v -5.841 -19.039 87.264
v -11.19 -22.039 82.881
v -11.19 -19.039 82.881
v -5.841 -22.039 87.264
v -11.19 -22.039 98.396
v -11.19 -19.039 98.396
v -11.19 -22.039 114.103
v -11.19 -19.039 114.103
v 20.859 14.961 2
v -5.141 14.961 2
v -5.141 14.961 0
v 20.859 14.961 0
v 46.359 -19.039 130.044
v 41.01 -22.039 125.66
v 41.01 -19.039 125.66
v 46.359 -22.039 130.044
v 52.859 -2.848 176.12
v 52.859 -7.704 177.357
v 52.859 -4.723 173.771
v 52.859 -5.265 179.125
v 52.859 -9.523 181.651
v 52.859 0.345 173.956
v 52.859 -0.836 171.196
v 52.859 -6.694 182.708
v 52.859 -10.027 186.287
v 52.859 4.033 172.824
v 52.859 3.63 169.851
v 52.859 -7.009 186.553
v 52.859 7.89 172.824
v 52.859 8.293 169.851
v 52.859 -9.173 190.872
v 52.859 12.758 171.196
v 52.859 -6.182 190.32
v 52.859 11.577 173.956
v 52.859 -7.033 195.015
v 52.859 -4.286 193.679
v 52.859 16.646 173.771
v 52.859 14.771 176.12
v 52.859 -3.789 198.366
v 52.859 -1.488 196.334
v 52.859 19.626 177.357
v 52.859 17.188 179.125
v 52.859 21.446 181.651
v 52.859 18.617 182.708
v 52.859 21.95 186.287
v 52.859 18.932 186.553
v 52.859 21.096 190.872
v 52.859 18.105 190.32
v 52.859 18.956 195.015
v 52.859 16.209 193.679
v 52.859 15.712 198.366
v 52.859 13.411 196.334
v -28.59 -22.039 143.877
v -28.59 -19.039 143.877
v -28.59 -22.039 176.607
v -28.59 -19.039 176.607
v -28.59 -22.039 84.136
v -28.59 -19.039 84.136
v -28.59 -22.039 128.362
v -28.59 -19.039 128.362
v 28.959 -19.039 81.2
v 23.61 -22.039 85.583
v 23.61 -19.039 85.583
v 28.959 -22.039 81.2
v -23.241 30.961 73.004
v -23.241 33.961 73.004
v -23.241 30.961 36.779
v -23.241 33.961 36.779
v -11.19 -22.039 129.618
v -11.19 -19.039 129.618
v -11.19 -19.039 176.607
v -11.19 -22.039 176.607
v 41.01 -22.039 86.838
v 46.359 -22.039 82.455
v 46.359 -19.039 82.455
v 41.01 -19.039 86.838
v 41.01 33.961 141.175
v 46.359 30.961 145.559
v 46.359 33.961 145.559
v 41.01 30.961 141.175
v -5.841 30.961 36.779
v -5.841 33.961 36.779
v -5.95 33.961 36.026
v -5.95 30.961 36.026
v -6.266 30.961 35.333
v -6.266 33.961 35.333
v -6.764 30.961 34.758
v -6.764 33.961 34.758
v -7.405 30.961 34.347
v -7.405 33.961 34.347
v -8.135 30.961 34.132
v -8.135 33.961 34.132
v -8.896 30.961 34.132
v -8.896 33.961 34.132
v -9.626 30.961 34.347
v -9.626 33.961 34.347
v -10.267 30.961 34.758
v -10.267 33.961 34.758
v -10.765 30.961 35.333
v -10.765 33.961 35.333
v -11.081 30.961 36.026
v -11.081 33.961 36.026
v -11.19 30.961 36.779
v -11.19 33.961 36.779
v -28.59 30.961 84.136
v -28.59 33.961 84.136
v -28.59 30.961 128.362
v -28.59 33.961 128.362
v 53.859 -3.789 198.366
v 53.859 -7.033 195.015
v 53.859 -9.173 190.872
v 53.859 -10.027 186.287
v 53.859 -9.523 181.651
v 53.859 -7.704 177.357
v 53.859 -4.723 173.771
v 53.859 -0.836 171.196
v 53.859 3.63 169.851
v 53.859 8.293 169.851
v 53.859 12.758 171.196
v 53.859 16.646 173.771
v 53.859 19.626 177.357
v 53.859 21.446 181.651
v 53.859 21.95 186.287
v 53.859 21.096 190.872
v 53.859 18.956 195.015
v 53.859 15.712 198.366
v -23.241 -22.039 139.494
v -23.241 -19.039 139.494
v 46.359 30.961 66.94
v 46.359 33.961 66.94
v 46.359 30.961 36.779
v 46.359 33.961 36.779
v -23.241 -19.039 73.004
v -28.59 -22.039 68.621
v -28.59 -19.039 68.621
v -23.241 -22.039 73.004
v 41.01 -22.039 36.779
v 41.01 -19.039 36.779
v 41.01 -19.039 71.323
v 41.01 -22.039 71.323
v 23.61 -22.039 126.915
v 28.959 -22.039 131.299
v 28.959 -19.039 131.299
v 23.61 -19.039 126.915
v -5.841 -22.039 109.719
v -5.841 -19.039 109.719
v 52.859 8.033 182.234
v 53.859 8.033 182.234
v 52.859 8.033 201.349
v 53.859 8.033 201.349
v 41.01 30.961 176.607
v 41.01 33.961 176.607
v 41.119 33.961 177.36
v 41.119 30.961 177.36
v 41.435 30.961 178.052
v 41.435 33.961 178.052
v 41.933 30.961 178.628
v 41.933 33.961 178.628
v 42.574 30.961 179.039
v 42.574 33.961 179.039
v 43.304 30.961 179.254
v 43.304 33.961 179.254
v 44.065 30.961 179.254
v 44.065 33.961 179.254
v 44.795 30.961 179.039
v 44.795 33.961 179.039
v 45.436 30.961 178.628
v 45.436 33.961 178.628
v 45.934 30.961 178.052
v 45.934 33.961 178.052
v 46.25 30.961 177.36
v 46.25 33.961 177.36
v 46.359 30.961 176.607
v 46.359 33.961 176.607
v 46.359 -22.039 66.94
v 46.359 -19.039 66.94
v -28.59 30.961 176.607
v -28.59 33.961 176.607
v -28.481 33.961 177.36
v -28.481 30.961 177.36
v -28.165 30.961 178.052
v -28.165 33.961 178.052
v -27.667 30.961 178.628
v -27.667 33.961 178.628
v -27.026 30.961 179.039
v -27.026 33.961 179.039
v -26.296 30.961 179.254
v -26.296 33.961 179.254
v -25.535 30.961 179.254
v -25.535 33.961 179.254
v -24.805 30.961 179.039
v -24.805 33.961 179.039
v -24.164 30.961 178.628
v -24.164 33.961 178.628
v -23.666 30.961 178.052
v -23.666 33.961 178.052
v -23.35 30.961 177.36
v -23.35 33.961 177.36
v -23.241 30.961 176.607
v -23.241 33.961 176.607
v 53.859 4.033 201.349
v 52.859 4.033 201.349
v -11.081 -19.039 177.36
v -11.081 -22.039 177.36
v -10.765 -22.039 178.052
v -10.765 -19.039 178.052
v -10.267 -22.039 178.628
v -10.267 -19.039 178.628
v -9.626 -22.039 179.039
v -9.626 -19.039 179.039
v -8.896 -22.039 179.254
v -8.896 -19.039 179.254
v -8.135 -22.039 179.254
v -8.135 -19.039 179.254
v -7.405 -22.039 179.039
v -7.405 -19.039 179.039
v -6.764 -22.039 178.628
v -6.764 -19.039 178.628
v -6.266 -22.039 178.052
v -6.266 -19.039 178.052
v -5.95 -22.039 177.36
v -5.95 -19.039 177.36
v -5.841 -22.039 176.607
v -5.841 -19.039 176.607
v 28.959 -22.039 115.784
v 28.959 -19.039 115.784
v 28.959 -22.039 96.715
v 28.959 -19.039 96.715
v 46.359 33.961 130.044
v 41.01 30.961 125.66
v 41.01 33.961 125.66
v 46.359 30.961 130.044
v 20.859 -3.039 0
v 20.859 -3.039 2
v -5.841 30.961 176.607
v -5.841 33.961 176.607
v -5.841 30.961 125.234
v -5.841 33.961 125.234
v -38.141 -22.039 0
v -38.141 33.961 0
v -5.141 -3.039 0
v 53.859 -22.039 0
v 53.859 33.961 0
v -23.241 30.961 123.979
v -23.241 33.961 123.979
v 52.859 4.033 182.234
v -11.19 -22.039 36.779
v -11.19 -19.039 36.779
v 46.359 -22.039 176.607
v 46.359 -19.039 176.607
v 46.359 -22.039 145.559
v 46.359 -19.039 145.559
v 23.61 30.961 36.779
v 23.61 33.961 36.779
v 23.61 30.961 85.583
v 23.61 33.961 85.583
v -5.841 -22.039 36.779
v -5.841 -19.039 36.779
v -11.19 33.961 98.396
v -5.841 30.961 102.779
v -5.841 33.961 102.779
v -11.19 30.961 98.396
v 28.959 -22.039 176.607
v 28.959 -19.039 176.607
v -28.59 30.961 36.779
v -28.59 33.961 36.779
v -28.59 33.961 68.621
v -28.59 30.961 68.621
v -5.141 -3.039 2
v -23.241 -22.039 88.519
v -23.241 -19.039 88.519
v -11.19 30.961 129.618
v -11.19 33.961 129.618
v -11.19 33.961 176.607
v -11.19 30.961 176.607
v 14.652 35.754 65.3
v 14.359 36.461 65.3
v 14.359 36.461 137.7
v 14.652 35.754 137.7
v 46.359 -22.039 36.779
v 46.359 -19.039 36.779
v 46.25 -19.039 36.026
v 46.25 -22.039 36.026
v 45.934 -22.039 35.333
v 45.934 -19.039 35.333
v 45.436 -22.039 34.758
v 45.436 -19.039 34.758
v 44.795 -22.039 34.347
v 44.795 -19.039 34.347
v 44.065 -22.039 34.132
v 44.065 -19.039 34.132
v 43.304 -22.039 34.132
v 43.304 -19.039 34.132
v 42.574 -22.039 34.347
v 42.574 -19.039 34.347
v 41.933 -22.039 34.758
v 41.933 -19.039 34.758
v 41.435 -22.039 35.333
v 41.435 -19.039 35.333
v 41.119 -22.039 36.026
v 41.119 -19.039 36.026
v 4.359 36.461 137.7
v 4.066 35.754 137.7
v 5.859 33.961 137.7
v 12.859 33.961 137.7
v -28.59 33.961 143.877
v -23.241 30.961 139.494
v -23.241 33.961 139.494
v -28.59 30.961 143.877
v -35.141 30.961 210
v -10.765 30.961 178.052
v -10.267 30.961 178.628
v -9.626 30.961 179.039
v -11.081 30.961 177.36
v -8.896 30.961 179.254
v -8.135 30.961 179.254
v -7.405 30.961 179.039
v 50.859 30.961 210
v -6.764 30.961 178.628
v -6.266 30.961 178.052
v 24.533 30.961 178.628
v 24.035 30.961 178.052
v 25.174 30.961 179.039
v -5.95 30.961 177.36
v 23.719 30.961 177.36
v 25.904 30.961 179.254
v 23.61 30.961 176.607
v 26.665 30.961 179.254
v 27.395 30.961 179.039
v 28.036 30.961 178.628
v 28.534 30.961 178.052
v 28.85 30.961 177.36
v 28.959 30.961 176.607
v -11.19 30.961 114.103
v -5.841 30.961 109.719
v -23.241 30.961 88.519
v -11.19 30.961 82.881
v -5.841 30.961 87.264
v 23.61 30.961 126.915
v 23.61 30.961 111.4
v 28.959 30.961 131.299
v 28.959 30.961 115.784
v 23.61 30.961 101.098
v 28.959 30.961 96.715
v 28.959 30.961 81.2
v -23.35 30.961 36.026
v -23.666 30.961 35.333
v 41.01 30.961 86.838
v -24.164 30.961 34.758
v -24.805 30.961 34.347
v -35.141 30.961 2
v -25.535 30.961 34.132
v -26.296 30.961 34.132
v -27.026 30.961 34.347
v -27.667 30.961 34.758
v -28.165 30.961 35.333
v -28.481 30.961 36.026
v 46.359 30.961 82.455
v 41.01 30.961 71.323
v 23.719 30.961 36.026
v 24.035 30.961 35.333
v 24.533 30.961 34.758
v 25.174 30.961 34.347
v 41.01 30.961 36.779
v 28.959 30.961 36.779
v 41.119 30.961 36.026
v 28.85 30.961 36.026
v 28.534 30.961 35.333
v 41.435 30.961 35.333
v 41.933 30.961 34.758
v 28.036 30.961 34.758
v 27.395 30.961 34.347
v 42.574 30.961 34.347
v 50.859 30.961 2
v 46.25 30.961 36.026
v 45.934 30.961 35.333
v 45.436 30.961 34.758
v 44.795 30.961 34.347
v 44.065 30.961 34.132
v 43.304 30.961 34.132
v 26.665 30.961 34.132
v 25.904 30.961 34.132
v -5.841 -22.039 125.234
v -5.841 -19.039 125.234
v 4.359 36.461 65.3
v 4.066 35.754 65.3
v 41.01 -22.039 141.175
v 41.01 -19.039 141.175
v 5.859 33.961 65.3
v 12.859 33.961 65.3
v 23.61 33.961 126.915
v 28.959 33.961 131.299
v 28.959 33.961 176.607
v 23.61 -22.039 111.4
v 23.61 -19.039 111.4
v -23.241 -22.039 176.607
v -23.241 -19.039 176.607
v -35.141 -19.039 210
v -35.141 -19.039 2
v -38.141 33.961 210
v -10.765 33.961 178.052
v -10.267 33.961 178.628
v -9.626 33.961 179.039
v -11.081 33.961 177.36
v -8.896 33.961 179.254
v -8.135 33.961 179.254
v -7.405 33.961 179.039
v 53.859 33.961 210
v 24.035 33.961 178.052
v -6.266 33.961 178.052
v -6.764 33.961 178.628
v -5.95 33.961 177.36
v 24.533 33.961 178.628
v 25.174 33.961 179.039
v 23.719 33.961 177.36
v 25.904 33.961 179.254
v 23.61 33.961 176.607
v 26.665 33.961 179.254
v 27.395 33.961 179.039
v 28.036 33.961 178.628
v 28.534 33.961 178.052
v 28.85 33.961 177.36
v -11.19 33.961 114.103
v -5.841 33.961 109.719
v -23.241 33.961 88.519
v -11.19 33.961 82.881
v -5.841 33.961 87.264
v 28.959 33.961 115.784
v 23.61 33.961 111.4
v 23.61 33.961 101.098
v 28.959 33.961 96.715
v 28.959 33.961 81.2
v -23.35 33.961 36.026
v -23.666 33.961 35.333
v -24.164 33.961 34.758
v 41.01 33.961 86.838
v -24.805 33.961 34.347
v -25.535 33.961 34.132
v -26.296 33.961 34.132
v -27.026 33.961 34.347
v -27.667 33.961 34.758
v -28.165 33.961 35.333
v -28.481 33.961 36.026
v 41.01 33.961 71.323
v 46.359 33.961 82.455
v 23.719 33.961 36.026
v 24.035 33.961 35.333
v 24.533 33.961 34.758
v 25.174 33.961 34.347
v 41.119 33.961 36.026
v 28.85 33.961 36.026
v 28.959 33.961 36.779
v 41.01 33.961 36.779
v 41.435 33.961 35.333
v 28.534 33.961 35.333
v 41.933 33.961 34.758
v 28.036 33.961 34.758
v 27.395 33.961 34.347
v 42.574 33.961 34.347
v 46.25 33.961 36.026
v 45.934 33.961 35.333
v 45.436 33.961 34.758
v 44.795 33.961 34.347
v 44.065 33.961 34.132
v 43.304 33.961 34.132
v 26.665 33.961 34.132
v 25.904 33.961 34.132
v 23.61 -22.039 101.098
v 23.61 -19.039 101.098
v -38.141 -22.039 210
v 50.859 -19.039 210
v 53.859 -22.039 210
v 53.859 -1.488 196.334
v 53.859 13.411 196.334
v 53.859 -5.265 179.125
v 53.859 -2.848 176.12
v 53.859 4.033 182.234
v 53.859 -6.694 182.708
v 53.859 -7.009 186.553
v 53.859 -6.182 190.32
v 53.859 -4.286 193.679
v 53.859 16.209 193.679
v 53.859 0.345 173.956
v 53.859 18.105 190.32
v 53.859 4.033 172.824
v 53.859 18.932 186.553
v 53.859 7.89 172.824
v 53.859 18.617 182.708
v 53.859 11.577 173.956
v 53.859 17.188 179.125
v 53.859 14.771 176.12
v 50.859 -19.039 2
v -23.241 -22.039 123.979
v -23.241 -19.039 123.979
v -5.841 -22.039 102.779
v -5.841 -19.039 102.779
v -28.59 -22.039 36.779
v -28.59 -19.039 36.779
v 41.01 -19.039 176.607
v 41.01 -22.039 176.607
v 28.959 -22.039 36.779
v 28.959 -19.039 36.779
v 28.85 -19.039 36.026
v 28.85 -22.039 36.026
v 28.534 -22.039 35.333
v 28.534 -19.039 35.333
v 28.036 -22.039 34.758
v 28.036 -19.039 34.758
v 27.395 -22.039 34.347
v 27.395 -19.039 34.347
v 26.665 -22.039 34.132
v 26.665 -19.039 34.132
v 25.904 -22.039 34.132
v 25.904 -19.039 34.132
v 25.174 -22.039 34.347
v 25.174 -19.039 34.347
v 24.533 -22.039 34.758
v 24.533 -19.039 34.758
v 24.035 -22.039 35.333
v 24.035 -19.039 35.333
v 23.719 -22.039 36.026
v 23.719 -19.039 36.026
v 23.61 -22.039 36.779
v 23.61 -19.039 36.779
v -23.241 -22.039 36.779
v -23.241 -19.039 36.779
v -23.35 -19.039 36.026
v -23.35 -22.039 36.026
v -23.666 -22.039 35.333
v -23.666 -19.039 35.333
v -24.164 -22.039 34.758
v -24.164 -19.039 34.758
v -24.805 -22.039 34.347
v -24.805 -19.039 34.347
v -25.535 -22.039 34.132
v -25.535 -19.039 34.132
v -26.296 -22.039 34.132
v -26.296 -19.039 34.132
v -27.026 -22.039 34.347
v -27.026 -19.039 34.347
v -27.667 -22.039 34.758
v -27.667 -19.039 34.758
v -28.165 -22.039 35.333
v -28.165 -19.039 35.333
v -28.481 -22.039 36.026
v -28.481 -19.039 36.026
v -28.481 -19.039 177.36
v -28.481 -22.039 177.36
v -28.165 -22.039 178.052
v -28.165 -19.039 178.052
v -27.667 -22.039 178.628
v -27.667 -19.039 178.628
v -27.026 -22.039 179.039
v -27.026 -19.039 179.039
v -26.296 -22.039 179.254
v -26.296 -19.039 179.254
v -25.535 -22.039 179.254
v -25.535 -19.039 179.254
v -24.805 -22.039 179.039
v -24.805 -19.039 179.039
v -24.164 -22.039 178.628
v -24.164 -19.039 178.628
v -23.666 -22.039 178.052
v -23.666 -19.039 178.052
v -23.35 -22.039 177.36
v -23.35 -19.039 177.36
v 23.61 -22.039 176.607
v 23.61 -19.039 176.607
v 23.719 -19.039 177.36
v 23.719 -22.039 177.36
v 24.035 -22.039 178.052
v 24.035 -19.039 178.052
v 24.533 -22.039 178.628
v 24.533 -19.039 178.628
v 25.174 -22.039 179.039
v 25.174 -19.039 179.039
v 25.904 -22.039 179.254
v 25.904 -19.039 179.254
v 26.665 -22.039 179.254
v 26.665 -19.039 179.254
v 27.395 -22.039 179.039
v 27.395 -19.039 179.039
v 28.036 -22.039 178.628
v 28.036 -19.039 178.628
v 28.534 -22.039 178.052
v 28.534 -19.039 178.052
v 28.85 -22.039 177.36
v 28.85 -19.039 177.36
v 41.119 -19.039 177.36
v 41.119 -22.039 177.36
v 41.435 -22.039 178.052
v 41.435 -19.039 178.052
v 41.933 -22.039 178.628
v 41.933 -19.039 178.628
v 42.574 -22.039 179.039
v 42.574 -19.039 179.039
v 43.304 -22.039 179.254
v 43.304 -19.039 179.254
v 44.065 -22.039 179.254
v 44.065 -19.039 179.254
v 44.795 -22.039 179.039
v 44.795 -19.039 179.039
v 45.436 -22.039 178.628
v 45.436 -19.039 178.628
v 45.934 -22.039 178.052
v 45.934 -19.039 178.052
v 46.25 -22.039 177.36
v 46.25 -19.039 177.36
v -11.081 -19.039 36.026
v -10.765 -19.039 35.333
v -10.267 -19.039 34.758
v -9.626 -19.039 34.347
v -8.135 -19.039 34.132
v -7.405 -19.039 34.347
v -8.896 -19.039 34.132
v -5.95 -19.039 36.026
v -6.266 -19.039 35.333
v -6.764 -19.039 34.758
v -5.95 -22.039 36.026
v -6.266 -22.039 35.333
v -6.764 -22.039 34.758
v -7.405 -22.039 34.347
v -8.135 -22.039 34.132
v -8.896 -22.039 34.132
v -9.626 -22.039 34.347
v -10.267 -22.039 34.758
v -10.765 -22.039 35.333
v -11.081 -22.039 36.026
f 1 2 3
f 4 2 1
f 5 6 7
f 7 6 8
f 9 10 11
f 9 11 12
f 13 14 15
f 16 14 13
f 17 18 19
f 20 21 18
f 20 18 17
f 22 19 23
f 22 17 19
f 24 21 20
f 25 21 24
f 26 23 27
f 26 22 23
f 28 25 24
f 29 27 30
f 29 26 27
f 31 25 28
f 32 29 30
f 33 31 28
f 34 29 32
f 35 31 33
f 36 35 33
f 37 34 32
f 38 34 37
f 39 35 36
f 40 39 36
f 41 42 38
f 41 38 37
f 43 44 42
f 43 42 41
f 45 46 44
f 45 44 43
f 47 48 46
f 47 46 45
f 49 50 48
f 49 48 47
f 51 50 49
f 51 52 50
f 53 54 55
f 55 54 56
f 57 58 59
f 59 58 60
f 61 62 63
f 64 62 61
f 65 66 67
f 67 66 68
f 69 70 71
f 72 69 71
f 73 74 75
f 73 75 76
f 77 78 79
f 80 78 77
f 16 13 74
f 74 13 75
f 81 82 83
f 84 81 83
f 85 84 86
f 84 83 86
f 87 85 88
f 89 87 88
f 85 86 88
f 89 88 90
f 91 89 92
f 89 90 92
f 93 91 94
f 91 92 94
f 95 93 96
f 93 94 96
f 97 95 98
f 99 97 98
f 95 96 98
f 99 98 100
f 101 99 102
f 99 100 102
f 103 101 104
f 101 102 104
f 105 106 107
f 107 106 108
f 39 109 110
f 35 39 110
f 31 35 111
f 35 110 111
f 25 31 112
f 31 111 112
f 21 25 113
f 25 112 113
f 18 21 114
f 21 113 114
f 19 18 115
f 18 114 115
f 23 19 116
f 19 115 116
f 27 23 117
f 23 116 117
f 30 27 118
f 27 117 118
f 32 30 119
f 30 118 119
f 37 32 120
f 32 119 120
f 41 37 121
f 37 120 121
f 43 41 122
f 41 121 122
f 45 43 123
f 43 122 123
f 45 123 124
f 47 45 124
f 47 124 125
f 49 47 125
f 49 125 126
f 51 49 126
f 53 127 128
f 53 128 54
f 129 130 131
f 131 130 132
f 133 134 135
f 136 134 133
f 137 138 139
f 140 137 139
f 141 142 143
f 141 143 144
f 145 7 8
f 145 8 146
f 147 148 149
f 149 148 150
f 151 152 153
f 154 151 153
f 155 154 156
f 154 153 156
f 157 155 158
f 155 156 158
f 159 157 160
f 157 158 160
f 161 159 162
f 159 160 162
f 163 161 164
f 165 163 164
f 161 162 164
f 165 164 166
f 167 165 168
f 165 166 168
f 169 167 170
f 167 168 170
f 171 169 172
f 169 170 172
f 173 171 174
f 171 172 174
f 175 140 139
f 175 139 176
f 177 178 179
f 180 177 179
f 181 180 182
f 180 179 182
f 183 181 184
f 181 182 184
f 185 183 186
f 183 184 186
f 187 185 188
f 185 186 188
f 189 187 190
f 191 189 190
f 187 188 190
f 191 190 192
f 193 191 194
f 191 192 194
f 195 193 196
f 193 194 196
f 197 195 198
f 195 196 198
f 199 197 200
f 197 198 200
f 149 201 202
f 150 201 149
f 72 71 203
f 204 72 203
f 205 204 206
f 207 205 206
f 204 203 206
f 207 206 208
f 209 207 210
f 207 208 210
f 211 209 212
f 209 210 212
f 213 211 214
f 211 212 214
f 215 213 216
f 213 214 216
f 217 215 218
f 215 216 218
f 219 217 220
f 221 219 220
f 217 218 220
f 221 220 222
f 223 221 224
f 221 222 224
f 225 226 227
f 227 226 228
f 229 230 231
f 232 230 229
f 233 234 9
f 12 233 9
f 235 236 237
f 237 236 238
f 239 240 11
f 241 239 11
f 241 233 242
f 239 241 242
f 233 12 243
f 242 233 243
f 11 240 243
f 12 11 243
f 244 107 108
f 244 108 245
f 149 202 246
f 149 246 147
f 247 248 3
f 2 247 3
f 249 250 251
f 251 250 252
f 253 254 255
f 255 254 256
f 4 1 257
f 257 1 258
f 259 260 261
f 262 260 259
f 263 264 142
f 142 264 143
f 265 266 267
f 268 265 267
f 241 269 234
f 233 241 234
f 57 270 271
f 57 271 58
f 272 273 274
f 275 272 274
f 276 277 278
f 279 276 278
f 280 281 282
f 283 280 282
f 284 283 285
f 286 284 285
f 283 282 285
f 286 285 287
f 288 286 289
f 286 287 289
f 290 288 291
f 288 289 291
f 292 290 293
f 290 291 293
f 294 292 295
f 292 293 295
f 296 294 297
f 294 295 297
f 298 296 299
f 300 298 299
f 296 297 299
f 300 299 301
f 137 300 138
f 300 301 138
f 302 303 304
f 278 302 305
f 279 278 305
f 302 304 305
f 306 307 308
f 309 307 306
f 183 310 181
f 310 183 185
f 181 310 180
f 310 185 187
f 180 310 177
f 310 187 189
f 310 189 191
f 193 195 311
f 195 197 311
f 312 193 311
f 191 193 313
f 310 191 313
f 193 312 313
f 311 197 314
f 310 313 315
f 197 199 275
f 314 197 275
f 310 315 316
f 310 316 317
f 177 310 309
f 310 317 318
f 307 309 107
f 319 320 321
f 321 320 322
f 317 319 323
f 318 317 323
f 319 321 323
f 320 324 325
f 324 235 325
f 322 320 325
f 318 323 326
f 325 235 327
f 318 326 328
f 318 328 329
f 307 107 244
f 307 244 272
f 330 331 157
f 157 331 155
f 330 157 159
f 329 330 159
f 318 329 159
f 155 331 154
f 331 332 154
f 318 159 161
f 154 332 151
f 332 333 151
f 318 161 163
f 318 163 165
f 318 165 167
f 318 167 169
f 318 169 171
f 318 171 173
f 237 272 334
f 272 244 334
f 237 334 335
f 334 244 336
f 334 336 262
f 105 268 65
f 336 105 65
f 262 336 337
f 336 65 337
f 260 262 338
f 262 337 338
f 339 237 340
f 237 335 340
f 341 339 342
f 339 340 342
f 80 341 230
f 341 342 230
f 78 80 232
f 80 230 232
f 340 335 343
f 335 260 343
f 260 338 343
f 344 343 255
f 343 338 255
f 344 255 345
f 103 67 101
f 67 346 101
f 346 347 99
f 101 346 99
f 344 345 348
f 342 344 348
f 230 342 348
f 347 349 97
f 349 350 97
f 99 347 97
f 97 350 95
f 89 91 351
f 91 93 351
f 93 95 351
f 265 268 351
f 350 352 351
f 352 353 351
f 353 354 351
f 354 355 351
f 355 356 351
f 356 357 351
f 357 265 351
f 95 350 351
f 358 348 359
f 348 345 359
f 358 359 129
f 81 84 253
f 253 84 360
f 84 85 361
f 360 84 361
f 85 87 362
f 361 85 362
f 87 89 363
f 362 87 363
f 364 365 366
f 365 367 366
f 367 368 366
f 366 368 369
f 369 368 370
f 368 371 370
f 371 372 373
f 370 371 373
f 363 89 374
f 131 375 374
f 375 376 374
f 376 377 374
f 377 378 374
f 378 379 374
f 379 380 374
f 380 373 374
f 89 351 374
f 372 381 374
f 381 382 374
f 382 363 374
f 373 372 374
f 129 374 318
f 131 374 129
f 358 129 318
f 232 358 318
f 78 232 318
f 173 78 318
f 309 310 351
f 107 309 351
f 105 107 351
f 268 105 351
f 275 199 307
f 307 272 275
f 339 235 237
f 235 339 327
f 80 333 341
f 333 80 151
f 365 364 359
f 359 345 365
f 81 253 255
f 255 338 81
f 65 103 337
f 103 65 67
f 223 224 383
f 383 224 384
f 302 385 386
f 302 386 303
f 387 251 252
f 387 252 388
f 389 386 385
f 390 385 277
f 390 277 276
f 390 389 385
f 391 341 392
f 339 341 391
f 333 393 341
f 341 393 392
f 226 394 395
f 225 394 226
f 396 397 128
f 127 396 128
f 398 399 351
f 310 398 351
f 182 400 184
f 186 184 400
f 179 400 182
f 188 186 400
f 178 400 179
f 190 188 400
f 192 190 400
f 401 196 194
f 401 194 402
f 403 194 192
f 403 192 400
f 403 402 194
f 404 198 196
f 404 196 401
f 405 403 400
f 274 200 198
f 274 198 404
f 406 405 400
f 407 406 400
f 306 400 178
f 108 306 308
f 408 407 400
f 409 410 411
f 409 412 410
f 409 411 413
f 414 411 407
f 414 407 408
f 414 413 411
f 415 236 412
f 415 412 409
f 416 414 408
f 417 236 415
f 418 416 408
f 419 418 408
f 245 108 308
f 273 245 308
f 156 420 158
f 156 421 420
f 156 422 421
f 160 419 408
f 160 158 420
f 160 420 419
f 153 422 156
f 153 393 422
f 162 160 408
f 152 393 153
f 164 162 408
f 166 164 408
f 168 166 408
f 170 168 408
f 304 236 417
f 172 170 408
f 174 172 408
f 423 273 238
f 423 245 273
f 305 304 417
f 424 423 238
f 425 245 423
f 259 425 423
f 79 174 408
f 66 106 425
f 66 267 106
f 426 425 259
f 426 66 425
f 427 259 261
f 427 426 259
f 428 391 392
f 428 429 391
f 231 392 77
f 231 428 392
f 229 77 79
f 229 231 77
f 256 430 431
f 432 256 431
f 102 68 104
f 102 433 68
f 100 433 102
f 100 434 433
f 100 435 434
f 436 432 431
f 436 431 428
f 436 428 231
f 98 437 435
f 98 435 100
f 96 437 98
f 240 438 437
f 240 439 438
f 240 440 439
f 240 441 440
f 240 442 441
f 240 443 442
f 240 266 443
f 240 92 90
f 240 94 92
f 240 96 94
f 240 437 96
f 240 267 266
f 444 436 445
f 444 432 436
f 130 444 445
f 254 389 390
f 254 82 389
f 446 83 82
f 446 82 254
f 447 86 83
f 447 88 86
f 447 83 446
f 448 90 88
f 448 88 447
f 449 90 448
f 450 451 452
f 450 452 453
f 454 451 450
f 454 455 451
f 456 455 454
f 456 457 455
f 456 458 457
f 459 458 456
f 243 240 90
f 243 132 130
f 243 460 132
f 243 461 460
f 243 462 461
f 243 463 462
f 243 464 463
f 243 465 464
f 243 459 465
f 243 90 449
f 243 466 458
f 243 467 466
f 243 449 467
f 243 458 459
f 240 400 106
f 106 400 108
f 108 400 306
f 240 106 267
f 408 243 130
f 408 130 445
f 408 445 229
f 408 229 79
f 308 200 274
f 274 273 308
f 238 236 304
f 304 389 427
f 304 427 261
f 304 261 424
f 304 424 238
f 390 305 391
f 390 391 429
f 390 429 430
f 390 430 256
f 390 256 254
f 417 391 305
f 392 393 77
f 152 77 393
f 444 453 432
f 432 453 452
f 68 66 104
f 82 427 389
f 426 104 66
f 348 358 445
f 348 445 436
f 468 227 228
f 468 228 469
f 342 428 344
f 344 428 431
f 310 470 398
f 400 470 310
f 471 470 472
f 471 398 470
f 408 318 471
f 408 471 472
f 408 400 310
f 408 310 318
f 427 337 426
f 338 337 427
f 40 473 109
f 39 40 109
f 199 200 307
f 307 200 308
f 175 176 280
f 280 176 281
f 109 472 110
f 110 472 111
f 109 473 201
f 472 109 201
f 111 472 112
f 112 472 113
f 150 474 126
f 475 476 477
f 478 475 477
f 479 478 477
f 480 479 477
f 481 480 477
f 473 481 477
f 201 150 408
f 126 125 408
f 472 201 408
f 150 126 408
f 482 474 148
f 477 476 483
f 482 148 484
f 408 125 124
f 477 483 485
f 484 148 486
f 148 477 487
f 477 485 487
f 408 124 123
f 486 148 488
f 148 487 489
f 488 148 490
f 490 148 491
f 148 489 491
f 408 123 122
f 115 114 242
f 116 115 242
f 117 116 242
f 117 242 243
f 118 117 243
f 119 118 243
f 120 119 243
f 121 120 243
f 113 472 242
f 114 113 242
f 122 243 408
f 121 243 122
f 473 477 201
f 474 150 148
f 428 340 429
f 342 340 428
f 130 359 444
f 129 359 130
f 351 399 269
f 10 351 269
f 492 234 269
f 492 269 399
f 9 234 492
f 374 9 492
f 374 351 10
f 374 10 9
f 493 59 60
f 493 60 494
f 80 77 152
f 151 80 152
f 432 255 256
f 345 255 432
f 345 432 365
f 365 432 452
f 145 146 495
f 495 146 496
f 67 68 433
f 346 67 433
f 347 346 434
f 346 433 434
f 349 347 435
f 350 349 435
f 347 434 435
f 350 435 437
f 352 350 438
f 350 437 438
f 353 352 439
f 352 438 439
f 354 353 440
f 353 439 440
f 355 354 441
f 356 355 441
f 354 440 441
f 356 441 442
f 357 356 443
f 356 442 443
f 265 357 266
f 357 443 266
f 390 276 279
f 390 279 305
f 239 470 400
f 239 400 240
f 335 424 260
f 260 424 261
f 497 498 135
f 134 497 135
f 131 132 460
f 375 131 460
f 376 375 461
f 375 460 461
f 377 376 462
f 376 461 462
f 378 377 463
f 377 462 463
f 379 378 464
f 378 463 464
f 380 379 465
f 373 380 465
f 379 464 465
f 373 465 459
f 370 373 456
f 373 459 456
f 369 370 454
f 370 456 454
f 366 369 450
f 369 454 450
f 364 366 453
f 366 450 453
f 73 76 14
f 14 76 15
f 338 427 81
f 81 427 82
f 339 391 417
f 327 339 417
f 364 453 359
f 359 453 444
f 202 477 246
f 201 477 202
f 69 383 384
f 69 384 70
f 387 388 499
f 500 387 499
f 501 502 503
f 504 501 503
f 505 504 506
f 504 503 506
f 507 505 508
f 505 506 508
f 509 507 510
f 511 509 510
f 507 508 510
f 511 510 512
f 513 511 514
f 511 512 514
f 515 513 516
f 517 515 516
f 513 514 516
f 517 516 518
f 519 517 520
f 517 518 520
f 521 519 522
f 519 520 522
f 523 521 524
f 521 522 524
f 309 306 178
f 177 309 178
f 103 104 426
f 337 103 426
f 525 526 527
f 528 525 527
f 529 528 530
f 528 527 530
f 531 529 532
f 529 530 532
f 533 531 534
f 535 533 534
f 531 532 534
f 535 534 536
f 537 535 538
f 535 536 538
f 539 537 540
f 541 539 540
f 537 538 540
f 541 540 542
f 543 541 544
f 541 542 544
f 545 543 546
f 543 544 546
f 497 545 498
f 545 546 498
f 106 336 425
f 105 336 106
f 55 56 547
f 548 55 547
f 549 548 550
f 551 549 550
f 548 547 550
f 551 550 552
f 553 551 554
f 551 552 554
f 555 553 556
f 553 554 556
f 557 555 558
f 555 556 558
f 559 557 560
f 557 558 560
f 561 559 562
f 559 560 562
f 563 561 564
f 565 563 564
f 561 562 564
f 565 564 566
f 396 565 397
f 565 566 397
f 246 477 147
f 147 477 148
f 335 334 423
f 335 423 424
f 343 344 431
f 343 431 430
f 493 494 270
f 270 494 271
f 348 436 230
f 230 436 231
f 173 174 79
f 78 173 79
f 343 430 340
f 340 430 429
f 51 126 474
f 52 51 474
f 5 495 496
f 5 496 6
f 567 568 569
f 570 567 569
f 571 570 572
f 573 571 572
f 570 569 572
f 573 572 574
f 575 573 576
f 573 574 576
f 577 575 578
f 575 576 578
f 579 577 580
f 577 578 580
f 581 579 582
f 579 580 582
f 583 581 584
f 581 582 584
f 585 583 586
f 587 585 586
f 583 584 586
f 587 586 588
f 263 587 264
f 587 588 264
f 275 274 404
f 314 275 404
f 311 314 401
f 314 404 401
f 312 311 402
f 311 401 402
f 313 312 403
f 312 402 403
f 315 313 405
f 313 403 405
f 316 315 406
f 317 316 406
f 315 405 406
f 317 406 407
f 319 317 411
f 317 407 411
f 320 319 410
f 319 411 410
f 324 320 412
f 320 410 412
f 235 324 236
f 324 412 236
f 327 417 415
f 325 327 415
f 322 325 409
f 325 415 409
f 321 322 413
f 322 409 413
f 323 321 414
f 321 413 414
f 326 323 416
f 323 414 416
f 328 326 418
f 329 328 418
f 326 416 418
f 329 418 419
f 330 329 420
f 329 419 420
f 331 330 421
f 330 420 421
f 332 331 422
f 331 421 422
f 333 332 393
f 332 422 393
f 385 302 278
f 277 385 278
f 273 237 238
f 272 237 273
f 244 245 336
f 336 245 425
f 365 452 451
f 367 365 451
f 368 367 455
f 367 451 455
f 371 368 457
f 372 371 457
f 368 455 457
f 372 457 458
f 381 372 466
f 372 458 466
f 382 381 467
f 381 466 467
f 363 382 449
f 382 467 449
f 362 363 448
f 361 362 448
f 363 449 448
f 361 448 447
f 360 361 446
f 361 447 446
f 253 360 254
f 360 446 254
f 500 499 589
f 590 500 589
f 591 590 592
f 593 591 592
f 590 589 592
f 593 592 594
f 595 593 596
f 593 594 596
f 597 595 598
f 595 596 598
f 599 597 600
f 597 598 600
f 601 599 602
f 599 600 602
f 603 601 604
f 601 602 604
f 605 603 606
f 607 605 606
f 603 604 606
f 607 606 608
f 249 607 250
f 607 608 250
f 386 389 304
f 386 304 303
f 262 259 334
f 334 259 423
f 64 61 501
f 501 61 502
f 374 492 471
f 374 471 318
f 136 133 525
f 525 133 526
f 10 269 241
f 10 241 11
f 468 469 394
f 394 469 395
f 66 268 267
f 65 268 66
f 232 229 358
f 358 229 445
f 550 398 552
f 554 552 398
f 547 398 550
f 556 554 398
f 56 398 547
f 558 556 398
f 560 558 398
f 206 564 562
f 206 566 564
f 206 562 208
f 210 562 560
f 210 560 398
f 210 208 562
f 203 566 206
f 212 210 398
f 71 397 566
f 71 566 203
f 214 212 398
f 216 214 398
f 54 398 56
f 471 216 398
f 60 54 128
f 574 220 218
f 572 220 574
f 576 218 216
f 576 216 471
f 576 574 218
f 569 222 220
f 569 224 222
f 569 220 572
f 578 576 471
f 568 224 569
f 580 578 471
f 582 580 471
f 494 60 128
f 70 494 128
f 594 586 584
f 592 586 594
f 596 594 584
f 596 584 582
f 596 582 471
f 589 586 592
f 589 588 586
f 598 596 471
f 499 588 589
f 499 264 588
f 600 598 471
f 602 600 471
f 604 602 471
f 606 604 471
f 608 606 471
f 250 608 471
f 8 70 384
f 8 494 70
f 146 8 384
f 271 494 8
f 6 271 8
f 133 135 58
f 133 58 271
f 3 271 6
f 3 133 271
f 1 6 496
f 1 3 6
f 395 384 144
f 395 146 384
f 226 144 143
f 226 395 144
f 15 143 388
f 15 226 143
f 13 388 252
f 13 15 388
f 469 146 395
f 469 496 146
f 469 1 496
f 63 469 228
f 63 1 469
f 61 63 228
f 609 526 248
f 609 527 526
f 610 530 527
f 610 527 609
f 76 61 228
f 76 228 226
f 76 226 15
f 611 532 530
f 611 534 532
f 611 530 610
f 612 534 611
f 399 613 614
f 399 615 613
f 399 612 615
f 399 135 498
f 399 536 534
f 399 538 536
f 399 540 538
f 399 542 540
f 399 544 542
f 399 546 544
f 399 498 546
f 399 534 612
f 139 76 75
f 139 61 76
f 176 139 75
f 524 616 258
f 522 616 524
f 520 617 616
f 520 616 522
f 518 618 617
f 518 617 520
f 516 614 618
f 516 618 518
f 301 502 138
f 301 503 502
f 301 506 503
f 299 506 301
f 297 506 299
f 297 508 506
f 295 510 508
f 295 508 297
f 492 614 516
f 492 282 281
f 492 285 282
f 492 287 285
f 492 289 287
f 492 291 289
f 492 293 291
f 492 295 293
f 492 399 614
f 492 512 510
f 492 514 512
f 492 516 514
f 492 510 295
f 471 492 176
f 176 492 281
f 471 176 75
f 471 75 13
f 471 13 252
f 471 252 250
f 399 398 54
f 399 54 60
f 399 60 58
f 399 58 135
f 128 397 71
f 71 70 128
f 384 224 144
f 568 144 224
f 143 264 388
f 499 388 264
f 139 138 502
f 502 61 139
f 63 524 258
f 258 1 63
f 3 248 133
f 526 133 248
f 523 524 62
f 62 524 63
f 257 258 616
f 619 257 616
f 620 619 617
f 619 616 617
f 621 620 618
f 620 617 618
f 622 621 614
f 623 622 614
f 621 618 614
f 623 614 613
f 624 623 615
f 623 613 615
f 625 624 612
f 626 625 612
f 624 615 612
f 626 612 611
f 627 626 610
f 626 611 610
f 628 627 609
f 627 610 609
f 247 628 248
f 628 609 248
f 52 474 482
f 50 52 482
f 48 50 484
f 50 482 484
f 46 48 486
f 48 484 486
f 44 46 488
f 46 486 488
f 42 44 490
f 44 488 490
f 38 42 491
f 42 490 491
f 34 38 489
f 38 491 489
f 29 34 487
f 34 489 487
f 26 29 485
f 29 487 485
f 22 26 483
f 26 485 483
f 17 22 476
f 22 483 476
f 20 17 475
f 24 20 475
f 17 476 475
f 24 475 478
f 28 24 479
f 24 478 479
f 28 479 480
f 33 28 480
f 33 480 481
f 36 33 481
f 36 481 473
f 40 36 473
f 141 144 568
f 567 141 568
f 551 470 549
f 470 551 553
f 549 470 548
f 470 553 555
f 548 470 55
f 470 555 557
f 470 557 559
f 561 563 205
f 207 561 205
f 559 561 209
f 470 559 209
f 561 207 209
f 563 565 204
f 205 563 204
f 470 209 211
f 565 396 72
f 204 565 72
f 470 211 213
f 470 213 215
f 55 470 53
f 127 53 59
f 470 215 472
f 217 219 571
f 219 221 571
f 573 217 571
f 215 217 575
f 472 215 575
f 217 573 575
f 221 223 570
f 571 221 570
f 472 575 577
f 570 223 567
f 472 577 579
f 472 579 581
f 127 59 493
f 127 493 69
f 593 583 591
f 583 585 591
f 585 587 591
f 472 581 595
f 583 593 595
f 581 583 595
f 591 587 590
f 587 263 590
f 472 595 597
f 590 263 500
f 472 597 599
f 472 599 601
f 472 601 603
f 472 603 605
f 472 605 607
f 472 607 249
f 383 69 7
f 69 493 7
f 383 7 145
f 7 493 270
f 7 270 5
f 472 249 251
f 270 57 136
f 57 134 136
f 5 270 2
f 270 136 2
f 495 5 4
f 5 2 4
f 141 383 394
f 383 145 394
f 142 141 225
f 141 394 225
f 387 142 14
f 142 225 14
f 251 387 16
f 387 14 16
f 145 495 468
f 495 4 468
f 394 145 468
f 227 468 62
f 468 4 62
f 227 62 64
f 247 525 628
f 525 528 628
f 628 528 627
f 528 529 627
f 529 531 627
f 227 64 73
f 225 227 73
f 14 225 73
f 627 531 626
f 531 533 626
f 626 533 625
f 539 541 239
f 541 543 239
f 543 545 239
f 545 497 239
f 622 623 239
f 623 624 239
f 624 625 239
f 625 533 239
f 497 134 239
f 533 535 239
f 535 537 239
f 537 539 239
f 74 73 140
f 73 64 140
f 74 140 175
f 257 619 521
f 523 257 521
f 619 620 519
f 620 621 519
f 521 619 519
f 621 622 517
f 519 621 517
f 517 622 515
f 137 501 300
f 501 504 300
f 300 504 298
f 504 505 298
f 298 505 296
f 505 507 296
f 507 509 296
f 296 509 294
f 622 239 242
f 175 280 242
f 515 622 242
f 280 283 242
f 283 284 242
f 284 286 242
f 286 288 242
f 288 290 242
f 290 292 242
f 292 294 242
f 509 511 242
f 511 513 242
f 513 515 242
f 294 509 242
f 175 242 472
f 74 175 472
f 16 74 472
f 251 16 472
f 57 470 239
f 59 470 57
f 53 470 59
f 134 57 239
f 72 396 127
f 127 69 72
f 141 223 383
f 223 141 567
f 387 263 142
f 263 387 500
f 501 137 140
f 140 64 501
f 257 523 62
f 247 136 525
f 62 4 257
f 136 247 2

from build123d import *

# Parameters (mm, degrees)
F0_W      = 92
F0_H      = 56
F0_W_2    = 86
F0_H_2    = 50
F1_DEPTH  = 210
F2_W      = 86
F2_H      = 50
F3_DEPTH  = 2
F4_W      = 26
F4_H      = 18
F5_DEPTH  = 25
F7_START  = -65.3
F7_DEPTH  = 72.4
F8_SIZE   = 1
F10_DEPTH = 56.001
F12_DEPTH = 3
F13_START = -53
F13_DEPTH = 3
F14_W     = 4
F14_H     = 19.115075469
F15_DEPTH = 1


with BuildPart() as f1:
    # F0 (on Top) → F1 (new body)
    with BuildSketch(Plane.XY):
        with Locations((7.8588197877, 5.9614046181)):
            Rectangle(F0_W, F0_H)
        with Locations((7.8588197877, 5.9614046181)):
            Rectangle(F0_W_2, F0_H_2, mode=Mode.SUBTRACT)
    extrude(amount=F1_DEPTH)

    # F2 (on Top) → F3 (join)
    with BuildSketch(Plane.XY):
        with Locations((7.8588197877, 5.9614046181)):
            Rectangle(F2_W, F2_H)
    extrude(amount=F3_DEPTH)

    # F4 (on face) → F5 (cut)
    with BuildSketch(Plane.XY.offset(2)):
        with Locations((7.8588197877, 5.9614046181)):
            Rectangle(F4_W, F4_H)
    extrude(amount=-F5_DEPTH, mode=Mode.SUBTRACT)

    # F6 (on face) → F7 (join)
    with BuildSketch(Plane(origin=(0, 0, 0), x_dir=(1, 0, 0), z_dir=(0, 0, -1)).offset(F7_START)):
        Polygon((12.8588197877, -33.9614046181), (5.8588197877, -33.9614046181), (3.3588197877, -36.4614046181), (15.3588197877, -36.4614046181), align=None)
    extrude(amount=-F7_DEPTH)

    # F8
    f8_edges = [f1.edges().sort_by_distance(p)[0] for p in [
        (15.35882, 36.461405, 101.5),
        (3.35882, 36.461405, 101.5),
    ]]
    chamfer(f8_edges, length=F8_SIZE)

    # F9 (on face) → F10 (cut, through all)
    with BuildSketch(Plane(origin=(0, 33.9614046181, 0), x_dir=(-1, 0, 0), z_dir=(0, 1, 0))):
        with BuildLine():
            Line((-23.6102305163, 36.7792584002), (-23.6102305163, 176.6065955162))
            ThreePointArc((-23.6102305163, 176.6065955162), (-26.284525152, 179.2808901519), (-28.9588197877, 176.6065955162))
            Line((-28.9588197877, 176.6065955162), (-28.9588197877, 36.7792584002))
            ThreePointArc((-28.9588197877, 36.7792584002), (-26.284525152, 34.1049637645), (-23.6102305163, 36.7792584002))
        make_face()
        with BuildLine():
            Line((11.1897694837, 36.7792584002), (11.1897694837, 176.6065955162))
            ThreePointArc((11.1897694837, 176.6065955162), (8.515474848, 179.2808901519), (5.8411802123, 176.6065955162))
            Line((5.8411802123, 176.6065955162), (5.8411802123, 36.7792584002))
            ThreePointArc((5.8411802123, 36.7792584002), (8.515474848, 34.1049637645), (11.1897694837, 36.7792584002))
        make_face()
        with BuildLine():
            Line((28.5897694837, 36.7792584002), (28.5897694837, 176.6065955162))
            ThreePointArc((28.5897694837, 176.6065955162), (25.915474848, 179.2808901519), (23.2411802123, 176.6065955162))
            Line((23.2411802123, 176.6065955162), (23.2411802123, 36.7792584002))
            ThreePointArc((23.2411802123, 36.7792584002), (25.915474848, 34.1049637645), (28.5897694837, 36.7792584002))
        make_face()
        with BuildLine():
            ThreePointArc((-41.0102305163, 176.6065955162), (-43.684525152, 179.2808901519), (-46.3588197877, 176.6065955162))
            Line((-46.3588197877, 176.6065955162), (-46.3588197877, 36.7792584002))
            ThreePointArc((-46.3588197877, 36.7792584002), (-43.684525152, 34.1049637645), (-41.0102305163, 36.7792584002))
            Line((-41.0102305163, 36.7792584002), (-41.0102305163, 176.6065955162))
        make_face()
    extrude(amount=-F10_DEPTH, mode=Mode.SUBTRACT)

    # F11 (on face) → F12 (join)
    with BuildSketch(Plane.XZ.offset(22.0385953819)):
        Polygon((-38.1411802123, 151.7051618288), (-38.1411802123, 136.1901685596), (-1.6069489009, 106.2492112246), (7.8588197877, 114.0067078593), align=None)
        Polygon((7.8588197877, 114.0067078593), (-1.6069489009, 106.2492112246), (7.8588197877, 98.49171459), (17.3245884762, 106.2492112246), align=None)
        Polygon((7.8588197877, 98.49171459), (-1.6069489009, 106.2492112246), (-38.1411802123, 76.3082538897), (-38.1411802123, 60.7932606204), align=None)
        Polygon((17.3245884762, 106.2492112246), (7.8588197877, 98.49171459), (53.8588197877, 60.7932606204), (53.8588197877, 76.3082538897), align=None)
        Polygon((53.8588197877, 151.7051618288), (7.8588197877, 114.0067078593), (17.3245884762, 106.2492112246), (53.8588197877, 136.1901685596), align=None)
    extrude(amount=-F12_DEPTH)

    # F11 (on face) → F13 (join)
    with BuildSketch(Plane.XZ.offset(22.0385953819).offset(F13_START)):
        Polygon((-38.1411802123, 151.7051618288), (-38.1411802123, 136.1901685596), (-1.6069489009, 106.2492112246), (7.8588197877, 114.0067078593), align=None)
        Polygon((7.8588197877, 114.0067078593), (-1.6069489009, 106.2492112246), (7.8588197877, 98.49171459), (17.3245884762, 106.2492112246), align=None)
        Polygon((7.8588197877, 98.49171459), (-1.6069489009, 106.2492112246), (-38.1411802123, 76.3082538897), (-38.1411802123, 60.7932606204), align=None)
        Polygon((17.3245884762, 106.2492112246), (7.8588197877, 98.49171459), (53.8588197877, 60.7932606204), (53.8588197877, 76.3082538897), align=None)
        Polygon((53.8588197877, 151.7051618288), (7.8588197877, 114.0067078593), (17.3245884762, 106.2492112246), (53.8588197877, 136.1901685596), align=None)
    extrude(amount=-F13_DEPTH)

    # F14 (on face) → F15 (cut)
    with BuildSketch(Plane.YZ.offset(53.8588197877)):
        with BuildLine():
            Line((-1.4880481935, 196.3340106044), (-3.7893929464, 198.3656088747))
            ThreePointArc((-3.7893929464, 198.3656088747), (5.9614046181, 169.6801074319), (15.7122021826, 198.3656088747))
            Line((15.7122021826, 198.3656088747), (13.4108574297, 196.3340106044))
            ThreePointArc((13.4108574297, 196.3340106044), (5.9614046181, 172.6801074319), (-1.4880481935, 196.3340106044))
        make_face()
        with Locations((6.0325704031, 191.79122895)):
            Rectangle(F14_W, F14_H)
    extrude(amount=-F15_DEPTH, mode=Mode.SUBTRACT)


solid = f1.part
